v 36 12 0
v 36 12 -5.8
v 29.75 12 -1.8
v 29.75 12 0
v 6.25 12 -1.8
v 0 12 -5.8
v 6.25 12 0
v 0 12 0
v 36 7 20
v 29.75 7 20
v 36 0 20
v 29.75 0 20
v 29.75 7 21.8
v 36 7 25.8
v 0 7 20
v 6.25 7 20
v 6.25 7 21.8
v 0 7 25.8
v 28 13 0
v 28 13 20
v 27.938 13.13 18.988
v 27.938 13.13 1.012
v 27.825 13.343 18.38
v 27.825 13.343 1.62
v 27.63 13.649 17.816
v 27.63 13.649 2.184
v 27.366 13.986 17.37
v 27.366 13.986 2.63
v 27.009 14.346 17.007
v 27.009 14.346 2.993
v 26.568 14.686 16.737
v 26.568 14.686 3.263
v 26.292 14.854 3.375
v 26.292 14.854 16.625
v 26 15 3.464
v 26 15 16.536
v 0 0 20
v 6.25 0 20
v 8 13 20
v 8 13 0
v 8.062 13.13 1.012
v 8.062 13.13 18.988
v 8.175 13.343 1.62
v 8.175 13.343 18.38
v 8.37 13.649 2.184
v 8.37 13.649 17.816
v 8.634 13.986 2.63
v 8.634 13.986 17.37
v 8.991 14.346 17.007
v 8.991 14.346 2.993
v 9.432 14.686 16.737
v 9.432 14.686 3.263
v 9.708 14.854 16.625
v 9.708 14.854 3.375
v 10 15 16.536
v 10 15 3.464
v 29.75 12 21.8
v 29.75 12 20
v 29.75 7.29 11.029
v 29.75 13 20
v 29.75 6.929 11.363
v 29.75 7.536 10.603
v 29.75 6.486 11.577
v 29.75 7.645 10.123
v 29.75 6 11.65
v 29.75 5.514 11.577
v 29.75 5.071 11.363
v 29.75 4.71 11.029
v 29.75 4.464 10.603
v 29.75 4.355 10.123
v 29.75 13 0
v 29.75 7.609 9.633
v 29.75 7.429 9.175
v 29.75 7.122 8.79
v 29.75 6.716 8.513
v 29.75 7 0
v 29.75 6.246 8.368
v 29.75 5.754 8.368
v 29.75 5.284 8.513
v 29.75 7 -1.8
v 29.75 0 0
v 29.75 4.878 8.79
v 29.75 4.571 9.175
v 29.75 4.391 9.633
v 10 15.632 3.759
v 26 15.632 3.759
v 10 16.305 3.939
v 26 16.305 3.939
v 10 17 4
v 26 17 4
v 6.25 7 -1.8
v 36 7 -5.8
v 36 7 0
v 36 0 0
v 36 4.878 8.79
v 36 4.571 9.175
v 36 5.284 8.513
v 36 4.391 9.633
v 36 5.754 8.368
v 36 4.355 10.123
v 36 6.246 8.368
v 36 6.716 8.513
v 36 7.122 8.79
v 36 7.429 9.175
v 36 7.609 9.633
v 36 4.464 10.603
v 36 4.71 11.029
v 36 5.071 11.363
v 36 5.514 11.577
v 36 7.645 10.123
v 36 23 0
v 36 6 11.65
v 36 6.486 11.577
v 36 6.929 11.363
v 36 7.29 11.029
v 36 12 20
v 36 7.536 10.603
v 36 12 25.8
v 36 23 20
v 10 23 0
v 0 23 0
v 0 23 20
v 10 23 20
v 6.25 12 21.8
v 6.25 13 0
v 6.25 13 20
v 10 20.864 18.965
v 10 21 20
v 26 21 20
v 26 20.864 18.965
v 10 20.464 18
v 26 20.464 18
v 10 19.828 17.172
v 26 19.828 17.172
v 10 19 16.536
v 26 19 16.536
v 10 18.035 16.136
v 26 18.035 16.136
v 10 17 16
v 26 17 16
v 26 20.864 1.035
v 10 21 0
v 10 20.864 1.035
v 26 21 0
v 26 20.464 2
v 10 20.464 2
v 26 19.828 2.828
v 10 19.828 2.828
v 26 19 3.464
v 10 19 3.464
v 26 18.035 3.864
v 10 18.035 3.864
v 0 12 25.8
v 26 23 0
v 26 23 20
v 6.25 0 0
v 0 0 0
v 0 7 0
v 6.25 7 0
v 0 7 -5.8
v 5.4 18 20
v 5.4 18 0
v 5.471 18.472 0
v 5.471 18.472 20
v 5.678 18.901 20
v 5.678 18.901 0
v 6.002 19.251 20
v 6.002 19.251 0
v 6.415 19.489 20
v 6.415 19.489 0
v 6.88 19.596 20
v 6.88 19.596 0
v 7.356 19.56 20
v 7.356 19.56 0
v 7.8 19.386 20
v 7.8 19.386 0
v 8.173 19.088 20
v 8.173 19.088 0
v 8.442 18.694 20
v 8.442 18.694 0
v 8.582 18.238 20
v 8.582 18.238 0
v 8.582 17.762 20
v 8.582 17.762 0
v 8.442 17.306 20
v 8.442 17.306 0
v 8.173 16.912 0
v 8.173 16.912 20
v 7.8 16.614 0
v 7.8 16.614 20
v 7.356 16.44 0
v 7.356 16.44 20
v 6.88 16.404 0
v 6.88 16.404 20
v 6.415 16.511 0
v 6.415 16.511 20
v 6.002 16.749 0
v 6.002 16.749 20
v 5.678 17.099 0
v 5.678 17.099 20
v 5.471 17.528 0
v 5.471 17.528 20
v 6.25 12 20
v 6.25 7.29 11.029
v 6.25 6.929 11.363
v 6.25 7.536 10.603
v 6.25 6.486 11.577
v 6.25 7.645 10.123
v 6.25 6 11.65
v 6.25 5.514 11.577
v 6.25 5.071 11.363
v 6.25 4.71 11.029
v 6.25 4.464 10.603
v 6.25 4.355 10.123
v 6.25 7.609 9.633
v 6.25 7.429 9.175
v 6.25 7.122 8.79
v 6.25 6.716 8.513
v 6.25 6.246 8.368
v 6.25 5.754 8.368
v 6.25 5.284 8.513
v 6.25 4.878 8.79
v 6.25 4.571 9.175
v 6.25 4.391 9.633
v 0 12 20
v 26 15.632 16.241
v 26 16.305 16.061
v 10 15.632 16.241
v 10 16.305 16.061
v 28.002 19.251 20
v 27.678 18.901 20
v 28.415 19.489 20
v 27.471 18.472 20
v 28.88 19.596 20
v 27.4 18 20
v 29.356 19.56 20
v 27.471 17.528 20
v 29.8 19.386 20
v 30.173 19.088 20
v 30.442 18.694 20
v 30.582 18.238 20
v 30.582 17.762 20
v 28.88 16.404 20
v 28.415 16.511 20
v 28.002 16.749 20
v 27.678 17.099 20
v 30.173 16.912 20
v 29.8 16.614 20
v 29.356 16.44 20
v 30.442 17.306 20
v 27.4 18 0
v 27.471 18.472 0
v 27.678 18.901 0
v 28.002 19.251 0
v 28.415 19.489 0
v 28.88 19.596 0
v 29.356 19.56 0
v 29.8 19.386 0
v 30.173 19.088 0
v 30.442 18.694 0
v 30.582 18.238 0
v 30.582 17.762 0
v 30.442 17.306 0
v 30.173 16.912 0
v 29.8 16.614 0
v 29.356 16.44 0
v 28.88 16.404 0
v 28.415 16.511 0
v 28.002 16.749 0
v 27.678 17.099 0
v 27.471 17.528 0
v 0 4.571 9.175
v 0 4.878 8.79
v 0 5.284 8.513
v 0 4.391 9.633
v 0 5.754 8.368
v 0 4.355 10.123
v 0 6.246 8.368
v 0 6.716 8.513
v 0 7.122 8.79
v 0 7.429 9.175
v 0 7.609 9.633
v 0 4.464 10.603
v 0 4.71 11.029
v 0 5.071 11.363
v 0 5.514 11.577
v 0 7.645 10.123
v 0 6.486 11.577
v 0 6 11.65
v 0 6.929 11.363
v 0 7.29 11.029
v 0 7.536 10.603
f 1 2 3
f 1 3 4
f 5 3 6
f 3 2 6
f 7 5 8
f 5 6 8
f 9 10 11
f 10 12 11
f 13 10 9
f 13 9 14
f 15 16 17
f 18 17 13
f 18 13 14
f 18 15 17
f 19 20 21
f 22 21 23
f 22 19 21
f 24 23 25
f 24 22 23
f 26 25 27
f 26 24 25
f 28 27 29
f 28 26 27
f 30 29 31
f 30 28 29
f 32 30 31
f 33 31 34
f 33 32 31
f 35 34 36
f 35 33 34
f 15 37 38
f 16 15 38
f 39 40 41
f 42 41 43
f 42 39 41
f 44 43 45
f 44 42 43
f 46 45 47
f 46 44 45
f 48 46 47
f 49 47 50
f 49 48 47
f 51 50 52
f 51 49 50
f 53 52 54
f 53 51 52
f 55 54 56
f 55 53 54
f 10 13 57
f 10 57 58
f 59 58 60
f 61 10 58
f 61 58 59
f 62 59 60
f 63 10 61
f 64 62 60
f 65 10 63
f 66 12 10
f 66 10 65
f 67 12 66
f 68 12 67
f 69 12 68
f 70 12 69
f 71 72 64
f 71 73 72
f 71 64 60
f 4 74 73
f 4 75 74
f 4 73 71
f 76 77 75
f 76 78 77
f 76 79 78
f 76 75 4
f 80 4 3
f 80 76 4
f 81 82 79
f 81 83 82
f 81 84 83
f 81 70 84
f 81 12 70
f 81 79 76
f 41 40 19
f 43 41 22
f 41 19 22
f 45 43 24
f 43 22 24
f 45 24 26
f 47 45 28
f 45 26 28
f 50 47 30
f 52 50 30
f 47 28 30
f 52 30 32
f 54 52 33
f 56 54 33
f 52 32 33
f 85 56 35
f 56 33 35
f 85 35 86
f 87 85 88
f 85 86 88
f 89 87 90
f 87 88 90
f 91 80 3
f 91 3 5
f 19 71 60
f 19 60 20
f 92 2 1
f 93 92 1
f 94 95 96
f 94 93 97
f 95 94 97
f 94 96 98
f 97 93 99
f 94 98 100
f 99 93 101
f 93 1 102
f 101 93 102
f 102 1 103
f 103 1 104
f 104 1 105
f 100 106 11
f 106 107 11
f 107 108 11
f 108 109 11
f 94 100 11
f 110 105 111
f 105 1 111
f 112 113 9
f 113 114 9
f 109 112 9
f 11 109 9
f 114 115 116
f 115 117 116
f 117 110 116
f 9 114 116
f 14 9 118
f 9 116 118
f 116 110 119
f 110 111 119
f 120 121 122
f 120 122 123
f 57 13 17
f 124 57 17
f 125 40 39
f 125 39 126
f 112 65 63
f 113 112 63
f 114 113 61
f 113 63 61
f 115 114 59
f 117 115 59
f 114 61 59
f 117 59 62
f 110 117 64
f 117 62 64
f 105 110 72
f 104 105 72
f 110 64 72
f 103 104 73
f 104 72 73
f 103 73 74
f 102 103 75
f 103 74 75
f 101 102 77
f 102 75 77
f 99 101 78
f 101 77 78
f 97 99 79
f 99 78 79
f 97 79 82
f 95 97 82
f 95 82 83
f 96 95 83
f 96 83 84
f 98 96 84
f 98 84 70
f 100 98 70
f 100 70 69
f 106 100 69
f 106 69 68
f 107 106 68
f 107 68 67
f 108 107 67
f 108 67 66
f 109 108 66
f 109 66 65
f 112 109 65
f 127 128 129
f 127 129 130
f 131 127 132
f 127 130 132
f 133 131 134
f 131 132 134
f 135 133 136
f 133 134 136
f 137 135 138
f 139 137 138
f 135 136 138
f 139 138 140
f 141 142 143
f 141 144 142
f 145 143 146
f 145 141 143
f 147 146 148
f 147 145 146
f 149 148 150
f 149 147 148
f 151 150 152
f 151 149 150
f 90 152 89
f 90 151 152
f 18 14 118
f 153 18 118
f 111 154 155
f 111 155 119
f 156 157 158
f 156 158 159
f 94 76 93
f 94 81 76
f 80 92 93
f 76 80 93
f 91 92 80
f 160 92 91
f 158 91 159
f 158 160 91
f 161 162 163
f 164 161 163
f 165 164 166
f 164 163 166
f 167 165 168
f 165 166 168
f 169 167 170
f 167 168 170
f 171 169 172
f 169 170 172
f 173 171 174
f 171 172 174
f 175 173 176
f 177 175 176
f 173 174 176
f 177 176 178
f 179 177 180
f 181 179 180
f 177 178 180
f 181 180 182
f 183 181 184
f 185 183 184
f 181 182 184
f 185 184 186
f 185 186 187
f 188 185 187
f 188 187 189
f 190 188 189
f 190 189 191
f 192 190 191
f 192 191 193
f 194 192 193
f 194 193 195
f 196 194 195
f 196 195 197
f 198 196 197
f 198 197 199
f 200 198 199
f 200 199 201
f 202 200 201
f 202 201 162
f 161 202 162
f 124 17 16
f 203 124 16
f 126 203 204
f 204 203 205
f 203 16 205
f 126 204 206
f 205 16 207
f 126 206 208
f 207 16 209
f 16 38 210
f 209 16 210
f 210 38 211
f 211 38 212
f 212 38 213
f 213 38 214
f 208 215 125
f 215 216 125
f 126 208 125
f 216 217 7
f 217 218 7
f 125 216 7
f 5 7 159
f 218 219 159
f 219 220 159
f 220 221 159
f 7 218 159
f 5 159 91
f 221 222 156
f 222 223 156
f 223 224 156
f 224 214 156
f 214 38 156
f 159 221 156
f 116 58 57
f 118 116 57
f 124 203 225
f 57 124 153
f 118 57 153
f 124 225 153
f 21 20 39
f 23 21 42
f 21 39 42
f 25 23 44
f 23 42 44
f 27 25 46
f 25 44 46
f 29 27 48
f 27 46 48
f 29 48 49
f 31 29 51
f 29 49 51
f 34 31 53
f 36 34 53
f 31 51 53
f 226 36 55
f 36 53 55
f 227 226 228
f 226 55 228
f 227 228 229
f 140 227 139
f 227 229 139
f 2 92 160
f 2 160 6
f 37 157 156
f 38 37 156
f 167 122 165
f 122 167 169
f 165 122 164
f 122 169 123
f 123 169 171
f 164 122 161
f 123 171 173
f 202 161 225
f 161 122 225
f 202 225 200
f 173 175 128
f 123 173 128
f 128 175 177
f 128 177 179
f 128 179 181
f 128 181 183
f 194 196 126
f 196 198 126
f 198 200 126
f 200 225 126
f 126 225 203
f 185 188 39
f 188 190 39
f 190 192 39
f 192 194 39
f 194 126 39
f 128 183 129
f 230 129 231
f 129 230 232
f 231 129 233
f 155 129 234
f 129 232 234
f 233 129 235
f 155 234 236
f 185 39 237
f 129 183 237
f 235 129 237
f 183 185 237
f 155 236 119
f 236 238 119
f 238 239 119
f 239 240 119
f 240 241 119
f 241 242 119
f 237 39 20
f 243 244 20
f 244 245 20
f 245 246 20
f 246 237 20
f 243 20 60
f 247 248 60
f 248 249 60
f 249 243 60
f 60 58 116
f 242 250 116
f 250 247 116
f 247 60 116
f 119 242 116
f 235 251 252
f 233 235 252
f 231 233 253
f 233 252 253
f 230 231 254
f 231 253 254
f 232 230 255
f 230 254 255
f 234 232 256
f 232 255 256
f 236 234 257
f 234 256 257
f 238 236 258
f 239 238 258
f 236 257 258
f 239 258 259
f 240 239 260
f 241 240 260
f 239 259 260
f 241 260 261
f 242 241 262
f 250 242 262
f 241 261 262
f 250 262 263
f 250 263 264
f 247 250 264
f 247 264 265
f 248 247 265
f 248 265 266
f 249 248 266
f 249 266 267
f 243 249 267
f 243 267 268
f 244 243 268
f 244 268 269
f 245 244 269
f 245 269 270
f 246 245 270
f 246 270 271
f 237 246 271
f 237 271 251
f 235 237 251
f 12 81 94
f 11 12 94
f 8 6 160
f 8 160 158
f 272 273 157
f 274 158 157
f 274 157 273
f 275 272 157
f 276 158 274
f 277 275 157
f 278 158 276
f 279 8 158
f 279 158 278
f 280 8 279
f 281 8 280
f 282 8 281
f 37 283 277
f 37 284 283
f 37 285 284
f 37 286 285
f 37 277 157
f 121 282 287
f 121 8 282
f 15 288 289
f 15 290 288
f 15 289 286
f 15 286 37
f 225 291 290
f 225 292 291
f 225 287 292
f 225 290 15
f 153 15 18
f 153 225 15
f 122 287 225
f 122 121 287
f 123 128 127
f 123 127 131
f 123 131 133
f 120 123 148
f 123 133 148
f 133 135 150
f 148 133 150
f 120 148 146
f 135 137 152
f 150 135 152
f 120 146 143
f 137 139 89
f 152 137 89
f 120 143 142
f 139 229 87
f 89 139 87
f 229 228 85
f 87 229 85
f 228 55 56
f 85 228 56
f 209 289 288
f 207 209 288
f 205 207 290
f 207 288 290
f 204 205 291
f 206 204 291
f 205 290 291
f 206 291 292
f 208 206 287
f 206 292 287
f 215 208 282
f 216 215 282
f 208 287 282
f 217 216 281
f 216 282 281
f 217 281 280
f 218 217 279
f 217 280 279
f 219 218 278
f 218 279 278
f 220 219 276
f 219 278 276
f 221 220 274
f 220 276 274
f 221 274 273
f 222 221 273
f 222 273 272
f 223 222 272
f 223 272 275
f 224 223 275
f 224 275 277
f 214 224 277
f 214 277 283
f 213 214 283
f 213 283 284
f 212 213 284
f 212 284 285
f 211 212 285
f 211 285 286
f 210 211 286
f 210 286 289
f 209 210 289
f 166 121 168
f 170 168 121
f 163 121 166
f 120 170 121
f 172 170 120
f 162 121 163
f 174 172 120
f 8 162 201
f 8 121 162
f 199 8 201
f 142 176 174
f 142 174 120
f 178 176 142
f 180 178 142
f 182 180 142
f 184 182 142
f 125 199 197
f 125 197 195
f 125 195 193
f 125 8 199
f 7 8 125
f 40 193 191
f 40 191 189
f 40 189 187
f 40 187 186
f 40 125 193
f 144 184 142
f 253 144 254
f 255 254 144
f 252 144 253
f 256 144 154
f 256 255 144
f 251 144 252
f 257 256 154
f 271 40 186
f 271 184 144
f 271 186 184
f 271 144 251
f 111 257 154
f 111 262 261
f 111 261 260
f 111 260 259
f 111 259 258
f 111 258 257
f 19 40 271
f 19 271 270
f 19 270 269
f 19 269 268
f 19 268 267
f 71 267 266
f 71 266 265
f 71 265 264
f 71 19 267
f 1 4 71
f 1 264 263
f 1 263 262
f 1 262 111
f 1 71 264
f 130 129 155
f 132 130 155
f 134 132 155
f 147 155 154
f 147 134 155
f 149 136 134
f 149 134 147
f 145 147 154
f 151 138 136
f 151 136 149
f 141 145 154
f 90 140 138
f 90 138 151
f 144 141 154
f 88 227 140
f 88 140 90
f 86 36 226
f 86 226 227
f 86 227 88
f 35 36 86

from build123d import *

# Parameters (mm, degrees)
SKETCH1_W           = 36
SKETCH1_H           = 20
BOSS_EXTRUDE1_DEPTH = 15
SKETCH2_W           = 23.5
SKETCH2_H           = 20
CUT_EXTRUDE1_DEPTH  = 13
SKETCH3_R           = 1.65
CUT_EXTRUDE2_DEPTH  = 44.829214002
SKETCH4_W           = 20
SKETCH4_H           = 12
CUT_EXTRUDE3_DEPTH  = 44.829214002
SKETCH5_W           = 10
SKETCH5_H           = 20
BOSS_EXTRUDE2_DEPTH = 8
SKETCH6_R           = 1.6
CUT_EXTRUDE4_DEPTH  = 48.16990566
SKETCH7_W           = 16
SKETCH7_H           = 4
BOSS_EXTRUDE3_DEPTH = 6
FILLET1_R           = 4
FILLET2_R           = 4
FILLET5_R           = 4
SKETCH8_W           = 5.8
SKETCH8_H           = 5
BOSS_EXTRUDE4_DEPTH = 36
SKETCH9_W           = 23.5
SKETCH9_H           = 1.8
CUT_EXTRUDE5_DEPTH  = 48.091825193


# Some blends are built 0.0001 mm under size
with BuildPart() as part:
    # Sketch1 → Boss-Extrude1 (new body)
    with BuildSketch(Plane(origin=(0, 0, 0), x_dir=(1, 0, 0), z_dir=(0, 1, 0))):
        with Locations((18, -10)):
            Rectangle(SKETCH1_W, SKETCH1_H)
    extrude(amount=BOSS_EXTRUDE1_DEPTH)

    # Sketch2 → Cut-Extrude1 (cut)
    with BuildSketch(Plane(origin=(0, 0, 0), x_dir=(-1, 0, 0), z_dir=(0, -1, 0))):
        with Locations((-18, -10)):
            Rectangle(SKETCH2_W, SKETCH2_H)
    extrude(amount=-CUT_EXTRUDE1_DEPTH, mode=Mode.SUBTRACT)

    # Sketch3 → Cut-Extrude2 (cut, through all)
    with BuildSketch(Plane.ZY):
        with Locations((10, 6)):
            Circle(SKETCH3_R)
    extrude(amount=-CUT_EXTRUDE2_DEPTH, mode=Mode.SUBTRACT)

    # Sketch4 → Cut-Extrude3 (cut, through all)
    with BuildSketch(Plane(origin=(0, 15, 0), x_dir=(1, 0, 0), z_dir=(0, 1, 0))):
        with Locations((18, -10)):
            Rectangle(SKETCH4_W, SKETCH4_H)
    extrude(amount=-CUT_EXTRUDE3_DEPTH, mode=Mode.SUBTRACT)

    # Sketch5 → Boss-Extrude2 (add)
    with BuildSketch(Plane(origin=(0, 15, 0), x_dir=(1, 0, 0), z_dir=(0, 1, 0))):
        with Locations((31, -10)):
            Rectangle(SKETCH5_W, SKETCH5_H)
        with Locations((5, -10)):
            Rectangle(SKETCH5_W, SKETCH5_H)
    extrude(amount=BOSS_EXTRUDE2_DEPTH)

    # Sketch6 → Cut-Extrude4 (cut, through all)
    with BuildSketch(Plane(origin=(0, 0, 0), x_dir=(-1, 0, 0), z_dir=(0, 0, -1))):
        with Locations((-29, 18)):
            Circle(SKETCH6_R)
        with Locations((-7, 18)):
            Circle(SKETCH6_R)
    extrude(amount=-CUT_EXTRUDE4_DEPTH, mode=Mode.SUBTRACT)

    # Sketch7 → Boss-Extrude3 (add)
    with BuildSketch(Plane(origin=(0, 15, 0), x_dir=(1, 0, 0), z_dir=(0, 1, 0))):
        with Locations((18, -18)):
            Rectangle(SKETCH7_W, SKETCH7_H)
        with Locations((18, -2)):
            Rectangle(SKETCH7_W, SKETCH7_H)
    extrude(amount=BOSS_EXTRUDE3_DEPTH)

    # Fillet1
    # the kernel refuses this fillet: 4 mm, written as the material it takes off along each edge
    with BuildSketch(Plane(origin=(8, 13, 16), x_dir=(0, 0, 1), z_dir=(1, 0, 0))) as fillet1_piece_1_section:
        with BuildLine():
            CenterArc((FILLET1_R, -FILLET1_R), FILLET1_R, 90, 90)
            Line((0, -FILLET1_R), (0, 0))
            Line((0, 0), (FILLET1_R, 0))
        make_face()
    fillet1_piece_1 = extrude(amount=20, mode=Mode.PRIVATE)
    fillet1_piece_1 = split(fillet1_piece_1, bisect_by=Plane(origin=(10, 13, 16), z_dir=(-1, 0, 0)), keep=Keep.TOP, mode=Mode.PRIVATE)
    fillet1_piece_1 = split(fillet1_piece_1, bisect_by=Plane(origin=(8, 15, 16), z_dir=(0, -1, 0)), keep=Keep.TOP, mode=Mode.PRIVATE)
    add(fillet1_piece_1, mode=Mode.SUBTRACT)
    with BuildSketch(Plane(origin=(8, 13, 16), x_dir=(0, 0, 1), z_dir=(1, 0, 0))) as fillet1_piece_2_section:
        with BuildLine():
            CenterArc((FILLET1_R, -FILLET1_R), FILLET1_R, 90, 90)
            Line((0, -FILLET1_R), (0, 0))
            Line((0, 0), (FILLET1_R, 0))
        make_face()
    fillet1_piece_2 = extrude(amount=20, mode=Mode.PRIVATE)
    fillet1_piece_2 = split(fillet1_piece_2, bisect_by=Plane(origin=(10, 13, 16), z_dir=(1, 0, 0)), keep=Keep.TOP, mode=Mode.PRIVATE)
    fillet1_piece_2 = split(fillet1_piece_2, bisect_by=Plane(origin=(26, 13, 16), z_dir=(-1, 0, 0)), keep=Keep.TOP, mode=Mode.PRIVATE)
    fillet1_piece_2 = split(fillet1_piece_2, bisect_by=Plane(origin=(8, 15, 16), z_dir=(0, -1, 0)), keep=Keep.TOP, mode=Mode.PRIVATE)
    add(fillet1_piece_2, mode=Mode.SUBTRACT)
    with BuildSketch(Plane(origin=(8, 13, 16), x_dir=(0, 0, 1), z_dir=(1, 0, 0))) as fillet1_piece_3_section:
        with BuildLine():
            CenterArc((FILLET1_R, -FILLET1_R), FILLET1_R, 90, 90)
            Line((0, -FILLET1_R), (0, 0))
            Line((0, 0), (FILLET1_R, 0))
        make_face()
    fillet1_piece_3 = extrude(amount=20, mode=Mode.PRIVATE)
    fillet1_piece_3 = split(fillet1_piece_3, bisect_by=Plane(origin=(10, 13, 16), z_dir=(1, 0, 0)), keep=Keep.TOP, mode=Mode.PRIVATE)
    fillet1_piece_3 = split(fillet1_piece_3, bisect_by=Plane(origin=(26, 13, 16), z_dir=(-1, 0, 0)), keep=Keep.TOP, mode=Mode.PRIVATE)
    fillet1_piece_3 = split(fillet1_piece_3, bisect_by=Plane(origin=(8, 15, 16), z_dir=(0, 1, 0)), keep=Keep.TOP, mode=Mode.PRIVATE)
    add(fillet1_piece_3, mode=Mode.SUBTRACT)
    with BuildSketch(Plane(origin=(8, 13, 16), x_dir=(0, 0, 1), z_dir=(1, 0, 0))) as fillet1_piece_4_section:
        with BuildLine():
            CenterArc((FILLET1_R, -FILLET1_R), FILLET1_R, 90, 90)
            Line((0, -FILLET1_R), (0, 0))
            Line((0, 0), (FILLET1_R, 0))
        make_face()
    fillet1_piece_4 = extrude(amount=20, mode=Mode.PRIVATE)
    fillet1_piece_4 = split(fillet1_piece_4, bisect_by=Plane(origin=(26, 13, 16), z_dir=(1, 0, 0)), keep=Keep.TOP, mode=Mode.PRIVATE)
    fillet1_piece_4 = split(fillet1_piece_4, bisect_by=Plane(origin=(8, 15, 16), z_dir=(0, -1, 0)), keep=Keep.TOP, mode=Mode.PRIVATE)
    add(fillet1_piece_4, mode=Mode.SUBTRACT)
    with BuildSketch(Plane(origin=(28, 13, 4), x_dir=(0, 0, -1), z_dir=(-1, 0, 0))) as fillet1_piece_5_section:
        with BuildLine():
            CenterArc((FILLET1_R, -FILLET1_R), FILLET1_R, 90, 90)
            Line((0, -FILLET1_R), (0, 0))
            Line((0, 0), (FILLET1_R, 0))
        make_face()
    fillet1_piece_5 = extrude(amount=20, mode=Mode.PRIVATE)
    fillet1_piece_5 = split(fillet1_piece_5, bisect_by=Plane(origin=(26, 13, 4), z_dir=(1, 0, 0)), keep=Keep.TOP, mode=Mode.PRIVATE)
    fillet1_piece_5 = split(fillet1_piece_5, bisect_by=Plane(origin=(28, 15, 4), z_dir=(0, -1, 0)), keep=Keep.TOP, mode=Mode.PRIVATE)
    add(fillet1_piece_5, mode=Mode.SUBTRACT)
    with BuildSketch(Plane(origin=(28, 13, 4), x_dir=(0, 0, -1), z_dir=(-1, 0, 0))) as fillet1_piece_6_section:
        with BuildLine():
            CenterArc((FILLET1_R, -FILLET1_R), FILLET1_R, 90, 90)
            Line((0, -FILLET1_R), (0, 0))
            Line((0, 0), (FILLET1_R, 0))
        make_face()
    fillet1_piece_6 = extrude(amount=20, mode=Mode.PRIVATE)
    fillet1_piece_6 = split(fillet1_piece_6, bisect_by=Plane(origin=(10, 13, 4), z_dir=(1, 0, 0)), keep=Keep.TOP, mode=Mode.PRIVATE)
    fillet1_piece_6 = split(fillet1_piece_6, bisect_by=Plane(origin=(26, 13, 4), z_dir=(-1, 0, 0)), keep=Keep.TOP, mode=Mode.PRIVATE)
    fillet1_piece_6 = split(fillet1_piece_6, bisect_by=Plane(origin=(28, 15, 4), z_dir=(0, -1, 0)), keep=Keep.TOP, mode=Mode.PRIVATE)
    add(fillet1_piece_6, mode=Mode.SUBTRACT)
    with BuildSketch(Plane(origin=(28, 13, 4), x_dir=(0, 0, -1), z_dir=(-1, 0, 0))) as fillet1_piece_7_section:
        with BuildLine():
            CenterArc((FILLET1_R, -FILLET1_R), FILLET1_R, 90, 90)
            Line((0, -FILLET1_R), (0, 0))
            Line((0, 0), (FILLET1_R, 0))
        make_face()
    fillet1_piece_7 = extrude(amount=20, mode=Mode.PRIVATE)
    fillet1_piece_7 = split(fillet1_piece_7, bisect_by=Plane(origin=(10, 13, 4), z_dir=(1, 0, 0)), keep=Keep.TOP, mode=Mode.PRIVATE)
    fillet1_piece_7 = split(fillet1_piece_7, bisect_by=Plane(origin=(26, 13, 4), z_dir=(-1, 0, 0)), keep=Keep.TOP, mode=Mode.PRIVATE)
    fillet1_piece_7 = split(fillet1_piece_7, bisect_by=Plane(origin=(28, 15, 4), z_dir=(0, 1, 0)), keep=Keep.TOP, mode=Mode.PRIVATE)
    add(fillet1_piece_7, mode=Mode.SUBTRACT)
    with BuildSketch(Plane(origin=(28, 13, 4), x_dir=(0, 0, -1), z_dir=(-1, 0, 0))) as fillet1_piece_8_section:
        with BuildLine():
            CenterArc((FILLET1_R, -FILLET1_R), FILLET1_R, 90, 90)
            Line((0, -FILLET1_R), (0, 0))
            Line((0, 0), (FILLET1_R, 0))
        make_face()
    fillet1_piece_8 = extrude(amount=20, mode=Mode.PRIVATE)
    fillet1_piece_8 = split(fillet1_piece_8, bisect_by=Plane(origin=(10, 13, 4), z_dir=(-1, 0, 0)), keep=Keep.TOP, mode=Mode.PRIVATE)
    fillet1_piece_8 = split(fillet1_piece_8, bisect_by=Plane(origin=(28, 15, 4), z_dir=(0, -1, 0)), keep=Keep.TOP, mode=Mode.PRIVATE)
    add(fillet1_piece_8, mode=Mode.SUBTRACT)

    # Fillet2
    # the kernel refuses this fillet: 4 mm, written as the material it adds along each edge
    with BuildSketch(Plane(origin=(8, 15, 21.535898385), x_dir=(1, 0, 0), z_dir=(0, 0, -1))) as fillet2_piece_1_section:
        with BuildLine():
            CenterArc((3.645751311, 3.645751311), FILLET2_R, 204.295188945, 41.409622109)
            Line((0, 2), (0, 0))
            Line((0, 0), (2, 0))
        make_face()
    fillet2_piece_1 = extrude(amount=23.07179677, mode=Mode.PRIVATE)
    fillet2_piece_1 = split(fillet2_piece_1, bisect_by=Plane(origin=(8, 15, 0), z_dir=(0, 0, 1)), keep=Keep.TOP, mode=Mode.PRIVATE)
    fillet2_piece_1 = split(fillet2_piece_1, bisect_by=Plane(origin=(8, 15, 20), z_dir=(0, 0, -1)), keep=Keep.TOP, mode=Mode.PRIVATE)
    add(fillet2_piece_1)
    with BuildSketch(Plane(origin=(28, 15, -1.535898385), x_dir=(-1, 0, 0), z_dir=(0, 0, 1))) as fillet2_piece_2_section:
        with BuildLine():
            CenterArc((3.645751311, 3.645751311), FILLET2_R, 204.295188945, 41.409622109)
            Line((0, 2), (0, 0))
            Line((0, 0), (2, 0))
        make_face()
    fillet2_piece_2 = extrude(amount=23.07179677, mode=Mode.PRIVATE)
    fillet2_piece_2 = split(fillet2_piece_2, bisect_by=Plane(origin=(28, 15, 0), z_dir=(0, 0, 1)), keep=Keep.TOP, mode=Mode.PRIVATE)
    fillet2_piece_2 = split(fillet2_piece_2, bisect_by=Plane(origin=(28, 15, 20), z_dir=(0, 0, -1)), keep=Keep.TOP, mode=Mode.PRIVATE)
    add(fillet2_piece_2)

    # Fillet5
    fillet5_edges = [part.edges().sort_by_distance(p)[0] for p in [
        (18, 21, 16),
        (18, 21, 4),
    ]]
    fillet(fillet5_edges, radius=FILLET5_R - 0.0001)  # a hair under: the kernel refuses the full size

    # Sketch8 → Boss-Extrude4 (add)
    with BuildSketch(Plane.ZY):
        with Locations((22.9, 9.5)):
            Rectangle(SKETCH8_W, SKETCH8_H)
        with Locations((-2.9, 9.5)):
            Rectangle(SKETCH8_W, SKETCH8_H)
    extrude(amount=-BOSS_EXTRUDE4_DEPTH)

    # Sketch9 → Cut-Extrude5 (cut, through all)
    with BuildSketch(Plane(origin=(0, 7, 0), x_dir=(-1, 0, 0), z_dir=(0, -1, 0))):
        with Locations((-18, 0.9)):
            Rectangle(SKETCH9_W, SKETCH9_H)
        with Locations((-18, -20.9)):
            Rectangle(SKETCH9_W, SKETCH9_H)
    extrude(amount=-CUT_EXTRUDE5_DEPTH, mode=Mode.SUBTRACT)


solid = part.part
